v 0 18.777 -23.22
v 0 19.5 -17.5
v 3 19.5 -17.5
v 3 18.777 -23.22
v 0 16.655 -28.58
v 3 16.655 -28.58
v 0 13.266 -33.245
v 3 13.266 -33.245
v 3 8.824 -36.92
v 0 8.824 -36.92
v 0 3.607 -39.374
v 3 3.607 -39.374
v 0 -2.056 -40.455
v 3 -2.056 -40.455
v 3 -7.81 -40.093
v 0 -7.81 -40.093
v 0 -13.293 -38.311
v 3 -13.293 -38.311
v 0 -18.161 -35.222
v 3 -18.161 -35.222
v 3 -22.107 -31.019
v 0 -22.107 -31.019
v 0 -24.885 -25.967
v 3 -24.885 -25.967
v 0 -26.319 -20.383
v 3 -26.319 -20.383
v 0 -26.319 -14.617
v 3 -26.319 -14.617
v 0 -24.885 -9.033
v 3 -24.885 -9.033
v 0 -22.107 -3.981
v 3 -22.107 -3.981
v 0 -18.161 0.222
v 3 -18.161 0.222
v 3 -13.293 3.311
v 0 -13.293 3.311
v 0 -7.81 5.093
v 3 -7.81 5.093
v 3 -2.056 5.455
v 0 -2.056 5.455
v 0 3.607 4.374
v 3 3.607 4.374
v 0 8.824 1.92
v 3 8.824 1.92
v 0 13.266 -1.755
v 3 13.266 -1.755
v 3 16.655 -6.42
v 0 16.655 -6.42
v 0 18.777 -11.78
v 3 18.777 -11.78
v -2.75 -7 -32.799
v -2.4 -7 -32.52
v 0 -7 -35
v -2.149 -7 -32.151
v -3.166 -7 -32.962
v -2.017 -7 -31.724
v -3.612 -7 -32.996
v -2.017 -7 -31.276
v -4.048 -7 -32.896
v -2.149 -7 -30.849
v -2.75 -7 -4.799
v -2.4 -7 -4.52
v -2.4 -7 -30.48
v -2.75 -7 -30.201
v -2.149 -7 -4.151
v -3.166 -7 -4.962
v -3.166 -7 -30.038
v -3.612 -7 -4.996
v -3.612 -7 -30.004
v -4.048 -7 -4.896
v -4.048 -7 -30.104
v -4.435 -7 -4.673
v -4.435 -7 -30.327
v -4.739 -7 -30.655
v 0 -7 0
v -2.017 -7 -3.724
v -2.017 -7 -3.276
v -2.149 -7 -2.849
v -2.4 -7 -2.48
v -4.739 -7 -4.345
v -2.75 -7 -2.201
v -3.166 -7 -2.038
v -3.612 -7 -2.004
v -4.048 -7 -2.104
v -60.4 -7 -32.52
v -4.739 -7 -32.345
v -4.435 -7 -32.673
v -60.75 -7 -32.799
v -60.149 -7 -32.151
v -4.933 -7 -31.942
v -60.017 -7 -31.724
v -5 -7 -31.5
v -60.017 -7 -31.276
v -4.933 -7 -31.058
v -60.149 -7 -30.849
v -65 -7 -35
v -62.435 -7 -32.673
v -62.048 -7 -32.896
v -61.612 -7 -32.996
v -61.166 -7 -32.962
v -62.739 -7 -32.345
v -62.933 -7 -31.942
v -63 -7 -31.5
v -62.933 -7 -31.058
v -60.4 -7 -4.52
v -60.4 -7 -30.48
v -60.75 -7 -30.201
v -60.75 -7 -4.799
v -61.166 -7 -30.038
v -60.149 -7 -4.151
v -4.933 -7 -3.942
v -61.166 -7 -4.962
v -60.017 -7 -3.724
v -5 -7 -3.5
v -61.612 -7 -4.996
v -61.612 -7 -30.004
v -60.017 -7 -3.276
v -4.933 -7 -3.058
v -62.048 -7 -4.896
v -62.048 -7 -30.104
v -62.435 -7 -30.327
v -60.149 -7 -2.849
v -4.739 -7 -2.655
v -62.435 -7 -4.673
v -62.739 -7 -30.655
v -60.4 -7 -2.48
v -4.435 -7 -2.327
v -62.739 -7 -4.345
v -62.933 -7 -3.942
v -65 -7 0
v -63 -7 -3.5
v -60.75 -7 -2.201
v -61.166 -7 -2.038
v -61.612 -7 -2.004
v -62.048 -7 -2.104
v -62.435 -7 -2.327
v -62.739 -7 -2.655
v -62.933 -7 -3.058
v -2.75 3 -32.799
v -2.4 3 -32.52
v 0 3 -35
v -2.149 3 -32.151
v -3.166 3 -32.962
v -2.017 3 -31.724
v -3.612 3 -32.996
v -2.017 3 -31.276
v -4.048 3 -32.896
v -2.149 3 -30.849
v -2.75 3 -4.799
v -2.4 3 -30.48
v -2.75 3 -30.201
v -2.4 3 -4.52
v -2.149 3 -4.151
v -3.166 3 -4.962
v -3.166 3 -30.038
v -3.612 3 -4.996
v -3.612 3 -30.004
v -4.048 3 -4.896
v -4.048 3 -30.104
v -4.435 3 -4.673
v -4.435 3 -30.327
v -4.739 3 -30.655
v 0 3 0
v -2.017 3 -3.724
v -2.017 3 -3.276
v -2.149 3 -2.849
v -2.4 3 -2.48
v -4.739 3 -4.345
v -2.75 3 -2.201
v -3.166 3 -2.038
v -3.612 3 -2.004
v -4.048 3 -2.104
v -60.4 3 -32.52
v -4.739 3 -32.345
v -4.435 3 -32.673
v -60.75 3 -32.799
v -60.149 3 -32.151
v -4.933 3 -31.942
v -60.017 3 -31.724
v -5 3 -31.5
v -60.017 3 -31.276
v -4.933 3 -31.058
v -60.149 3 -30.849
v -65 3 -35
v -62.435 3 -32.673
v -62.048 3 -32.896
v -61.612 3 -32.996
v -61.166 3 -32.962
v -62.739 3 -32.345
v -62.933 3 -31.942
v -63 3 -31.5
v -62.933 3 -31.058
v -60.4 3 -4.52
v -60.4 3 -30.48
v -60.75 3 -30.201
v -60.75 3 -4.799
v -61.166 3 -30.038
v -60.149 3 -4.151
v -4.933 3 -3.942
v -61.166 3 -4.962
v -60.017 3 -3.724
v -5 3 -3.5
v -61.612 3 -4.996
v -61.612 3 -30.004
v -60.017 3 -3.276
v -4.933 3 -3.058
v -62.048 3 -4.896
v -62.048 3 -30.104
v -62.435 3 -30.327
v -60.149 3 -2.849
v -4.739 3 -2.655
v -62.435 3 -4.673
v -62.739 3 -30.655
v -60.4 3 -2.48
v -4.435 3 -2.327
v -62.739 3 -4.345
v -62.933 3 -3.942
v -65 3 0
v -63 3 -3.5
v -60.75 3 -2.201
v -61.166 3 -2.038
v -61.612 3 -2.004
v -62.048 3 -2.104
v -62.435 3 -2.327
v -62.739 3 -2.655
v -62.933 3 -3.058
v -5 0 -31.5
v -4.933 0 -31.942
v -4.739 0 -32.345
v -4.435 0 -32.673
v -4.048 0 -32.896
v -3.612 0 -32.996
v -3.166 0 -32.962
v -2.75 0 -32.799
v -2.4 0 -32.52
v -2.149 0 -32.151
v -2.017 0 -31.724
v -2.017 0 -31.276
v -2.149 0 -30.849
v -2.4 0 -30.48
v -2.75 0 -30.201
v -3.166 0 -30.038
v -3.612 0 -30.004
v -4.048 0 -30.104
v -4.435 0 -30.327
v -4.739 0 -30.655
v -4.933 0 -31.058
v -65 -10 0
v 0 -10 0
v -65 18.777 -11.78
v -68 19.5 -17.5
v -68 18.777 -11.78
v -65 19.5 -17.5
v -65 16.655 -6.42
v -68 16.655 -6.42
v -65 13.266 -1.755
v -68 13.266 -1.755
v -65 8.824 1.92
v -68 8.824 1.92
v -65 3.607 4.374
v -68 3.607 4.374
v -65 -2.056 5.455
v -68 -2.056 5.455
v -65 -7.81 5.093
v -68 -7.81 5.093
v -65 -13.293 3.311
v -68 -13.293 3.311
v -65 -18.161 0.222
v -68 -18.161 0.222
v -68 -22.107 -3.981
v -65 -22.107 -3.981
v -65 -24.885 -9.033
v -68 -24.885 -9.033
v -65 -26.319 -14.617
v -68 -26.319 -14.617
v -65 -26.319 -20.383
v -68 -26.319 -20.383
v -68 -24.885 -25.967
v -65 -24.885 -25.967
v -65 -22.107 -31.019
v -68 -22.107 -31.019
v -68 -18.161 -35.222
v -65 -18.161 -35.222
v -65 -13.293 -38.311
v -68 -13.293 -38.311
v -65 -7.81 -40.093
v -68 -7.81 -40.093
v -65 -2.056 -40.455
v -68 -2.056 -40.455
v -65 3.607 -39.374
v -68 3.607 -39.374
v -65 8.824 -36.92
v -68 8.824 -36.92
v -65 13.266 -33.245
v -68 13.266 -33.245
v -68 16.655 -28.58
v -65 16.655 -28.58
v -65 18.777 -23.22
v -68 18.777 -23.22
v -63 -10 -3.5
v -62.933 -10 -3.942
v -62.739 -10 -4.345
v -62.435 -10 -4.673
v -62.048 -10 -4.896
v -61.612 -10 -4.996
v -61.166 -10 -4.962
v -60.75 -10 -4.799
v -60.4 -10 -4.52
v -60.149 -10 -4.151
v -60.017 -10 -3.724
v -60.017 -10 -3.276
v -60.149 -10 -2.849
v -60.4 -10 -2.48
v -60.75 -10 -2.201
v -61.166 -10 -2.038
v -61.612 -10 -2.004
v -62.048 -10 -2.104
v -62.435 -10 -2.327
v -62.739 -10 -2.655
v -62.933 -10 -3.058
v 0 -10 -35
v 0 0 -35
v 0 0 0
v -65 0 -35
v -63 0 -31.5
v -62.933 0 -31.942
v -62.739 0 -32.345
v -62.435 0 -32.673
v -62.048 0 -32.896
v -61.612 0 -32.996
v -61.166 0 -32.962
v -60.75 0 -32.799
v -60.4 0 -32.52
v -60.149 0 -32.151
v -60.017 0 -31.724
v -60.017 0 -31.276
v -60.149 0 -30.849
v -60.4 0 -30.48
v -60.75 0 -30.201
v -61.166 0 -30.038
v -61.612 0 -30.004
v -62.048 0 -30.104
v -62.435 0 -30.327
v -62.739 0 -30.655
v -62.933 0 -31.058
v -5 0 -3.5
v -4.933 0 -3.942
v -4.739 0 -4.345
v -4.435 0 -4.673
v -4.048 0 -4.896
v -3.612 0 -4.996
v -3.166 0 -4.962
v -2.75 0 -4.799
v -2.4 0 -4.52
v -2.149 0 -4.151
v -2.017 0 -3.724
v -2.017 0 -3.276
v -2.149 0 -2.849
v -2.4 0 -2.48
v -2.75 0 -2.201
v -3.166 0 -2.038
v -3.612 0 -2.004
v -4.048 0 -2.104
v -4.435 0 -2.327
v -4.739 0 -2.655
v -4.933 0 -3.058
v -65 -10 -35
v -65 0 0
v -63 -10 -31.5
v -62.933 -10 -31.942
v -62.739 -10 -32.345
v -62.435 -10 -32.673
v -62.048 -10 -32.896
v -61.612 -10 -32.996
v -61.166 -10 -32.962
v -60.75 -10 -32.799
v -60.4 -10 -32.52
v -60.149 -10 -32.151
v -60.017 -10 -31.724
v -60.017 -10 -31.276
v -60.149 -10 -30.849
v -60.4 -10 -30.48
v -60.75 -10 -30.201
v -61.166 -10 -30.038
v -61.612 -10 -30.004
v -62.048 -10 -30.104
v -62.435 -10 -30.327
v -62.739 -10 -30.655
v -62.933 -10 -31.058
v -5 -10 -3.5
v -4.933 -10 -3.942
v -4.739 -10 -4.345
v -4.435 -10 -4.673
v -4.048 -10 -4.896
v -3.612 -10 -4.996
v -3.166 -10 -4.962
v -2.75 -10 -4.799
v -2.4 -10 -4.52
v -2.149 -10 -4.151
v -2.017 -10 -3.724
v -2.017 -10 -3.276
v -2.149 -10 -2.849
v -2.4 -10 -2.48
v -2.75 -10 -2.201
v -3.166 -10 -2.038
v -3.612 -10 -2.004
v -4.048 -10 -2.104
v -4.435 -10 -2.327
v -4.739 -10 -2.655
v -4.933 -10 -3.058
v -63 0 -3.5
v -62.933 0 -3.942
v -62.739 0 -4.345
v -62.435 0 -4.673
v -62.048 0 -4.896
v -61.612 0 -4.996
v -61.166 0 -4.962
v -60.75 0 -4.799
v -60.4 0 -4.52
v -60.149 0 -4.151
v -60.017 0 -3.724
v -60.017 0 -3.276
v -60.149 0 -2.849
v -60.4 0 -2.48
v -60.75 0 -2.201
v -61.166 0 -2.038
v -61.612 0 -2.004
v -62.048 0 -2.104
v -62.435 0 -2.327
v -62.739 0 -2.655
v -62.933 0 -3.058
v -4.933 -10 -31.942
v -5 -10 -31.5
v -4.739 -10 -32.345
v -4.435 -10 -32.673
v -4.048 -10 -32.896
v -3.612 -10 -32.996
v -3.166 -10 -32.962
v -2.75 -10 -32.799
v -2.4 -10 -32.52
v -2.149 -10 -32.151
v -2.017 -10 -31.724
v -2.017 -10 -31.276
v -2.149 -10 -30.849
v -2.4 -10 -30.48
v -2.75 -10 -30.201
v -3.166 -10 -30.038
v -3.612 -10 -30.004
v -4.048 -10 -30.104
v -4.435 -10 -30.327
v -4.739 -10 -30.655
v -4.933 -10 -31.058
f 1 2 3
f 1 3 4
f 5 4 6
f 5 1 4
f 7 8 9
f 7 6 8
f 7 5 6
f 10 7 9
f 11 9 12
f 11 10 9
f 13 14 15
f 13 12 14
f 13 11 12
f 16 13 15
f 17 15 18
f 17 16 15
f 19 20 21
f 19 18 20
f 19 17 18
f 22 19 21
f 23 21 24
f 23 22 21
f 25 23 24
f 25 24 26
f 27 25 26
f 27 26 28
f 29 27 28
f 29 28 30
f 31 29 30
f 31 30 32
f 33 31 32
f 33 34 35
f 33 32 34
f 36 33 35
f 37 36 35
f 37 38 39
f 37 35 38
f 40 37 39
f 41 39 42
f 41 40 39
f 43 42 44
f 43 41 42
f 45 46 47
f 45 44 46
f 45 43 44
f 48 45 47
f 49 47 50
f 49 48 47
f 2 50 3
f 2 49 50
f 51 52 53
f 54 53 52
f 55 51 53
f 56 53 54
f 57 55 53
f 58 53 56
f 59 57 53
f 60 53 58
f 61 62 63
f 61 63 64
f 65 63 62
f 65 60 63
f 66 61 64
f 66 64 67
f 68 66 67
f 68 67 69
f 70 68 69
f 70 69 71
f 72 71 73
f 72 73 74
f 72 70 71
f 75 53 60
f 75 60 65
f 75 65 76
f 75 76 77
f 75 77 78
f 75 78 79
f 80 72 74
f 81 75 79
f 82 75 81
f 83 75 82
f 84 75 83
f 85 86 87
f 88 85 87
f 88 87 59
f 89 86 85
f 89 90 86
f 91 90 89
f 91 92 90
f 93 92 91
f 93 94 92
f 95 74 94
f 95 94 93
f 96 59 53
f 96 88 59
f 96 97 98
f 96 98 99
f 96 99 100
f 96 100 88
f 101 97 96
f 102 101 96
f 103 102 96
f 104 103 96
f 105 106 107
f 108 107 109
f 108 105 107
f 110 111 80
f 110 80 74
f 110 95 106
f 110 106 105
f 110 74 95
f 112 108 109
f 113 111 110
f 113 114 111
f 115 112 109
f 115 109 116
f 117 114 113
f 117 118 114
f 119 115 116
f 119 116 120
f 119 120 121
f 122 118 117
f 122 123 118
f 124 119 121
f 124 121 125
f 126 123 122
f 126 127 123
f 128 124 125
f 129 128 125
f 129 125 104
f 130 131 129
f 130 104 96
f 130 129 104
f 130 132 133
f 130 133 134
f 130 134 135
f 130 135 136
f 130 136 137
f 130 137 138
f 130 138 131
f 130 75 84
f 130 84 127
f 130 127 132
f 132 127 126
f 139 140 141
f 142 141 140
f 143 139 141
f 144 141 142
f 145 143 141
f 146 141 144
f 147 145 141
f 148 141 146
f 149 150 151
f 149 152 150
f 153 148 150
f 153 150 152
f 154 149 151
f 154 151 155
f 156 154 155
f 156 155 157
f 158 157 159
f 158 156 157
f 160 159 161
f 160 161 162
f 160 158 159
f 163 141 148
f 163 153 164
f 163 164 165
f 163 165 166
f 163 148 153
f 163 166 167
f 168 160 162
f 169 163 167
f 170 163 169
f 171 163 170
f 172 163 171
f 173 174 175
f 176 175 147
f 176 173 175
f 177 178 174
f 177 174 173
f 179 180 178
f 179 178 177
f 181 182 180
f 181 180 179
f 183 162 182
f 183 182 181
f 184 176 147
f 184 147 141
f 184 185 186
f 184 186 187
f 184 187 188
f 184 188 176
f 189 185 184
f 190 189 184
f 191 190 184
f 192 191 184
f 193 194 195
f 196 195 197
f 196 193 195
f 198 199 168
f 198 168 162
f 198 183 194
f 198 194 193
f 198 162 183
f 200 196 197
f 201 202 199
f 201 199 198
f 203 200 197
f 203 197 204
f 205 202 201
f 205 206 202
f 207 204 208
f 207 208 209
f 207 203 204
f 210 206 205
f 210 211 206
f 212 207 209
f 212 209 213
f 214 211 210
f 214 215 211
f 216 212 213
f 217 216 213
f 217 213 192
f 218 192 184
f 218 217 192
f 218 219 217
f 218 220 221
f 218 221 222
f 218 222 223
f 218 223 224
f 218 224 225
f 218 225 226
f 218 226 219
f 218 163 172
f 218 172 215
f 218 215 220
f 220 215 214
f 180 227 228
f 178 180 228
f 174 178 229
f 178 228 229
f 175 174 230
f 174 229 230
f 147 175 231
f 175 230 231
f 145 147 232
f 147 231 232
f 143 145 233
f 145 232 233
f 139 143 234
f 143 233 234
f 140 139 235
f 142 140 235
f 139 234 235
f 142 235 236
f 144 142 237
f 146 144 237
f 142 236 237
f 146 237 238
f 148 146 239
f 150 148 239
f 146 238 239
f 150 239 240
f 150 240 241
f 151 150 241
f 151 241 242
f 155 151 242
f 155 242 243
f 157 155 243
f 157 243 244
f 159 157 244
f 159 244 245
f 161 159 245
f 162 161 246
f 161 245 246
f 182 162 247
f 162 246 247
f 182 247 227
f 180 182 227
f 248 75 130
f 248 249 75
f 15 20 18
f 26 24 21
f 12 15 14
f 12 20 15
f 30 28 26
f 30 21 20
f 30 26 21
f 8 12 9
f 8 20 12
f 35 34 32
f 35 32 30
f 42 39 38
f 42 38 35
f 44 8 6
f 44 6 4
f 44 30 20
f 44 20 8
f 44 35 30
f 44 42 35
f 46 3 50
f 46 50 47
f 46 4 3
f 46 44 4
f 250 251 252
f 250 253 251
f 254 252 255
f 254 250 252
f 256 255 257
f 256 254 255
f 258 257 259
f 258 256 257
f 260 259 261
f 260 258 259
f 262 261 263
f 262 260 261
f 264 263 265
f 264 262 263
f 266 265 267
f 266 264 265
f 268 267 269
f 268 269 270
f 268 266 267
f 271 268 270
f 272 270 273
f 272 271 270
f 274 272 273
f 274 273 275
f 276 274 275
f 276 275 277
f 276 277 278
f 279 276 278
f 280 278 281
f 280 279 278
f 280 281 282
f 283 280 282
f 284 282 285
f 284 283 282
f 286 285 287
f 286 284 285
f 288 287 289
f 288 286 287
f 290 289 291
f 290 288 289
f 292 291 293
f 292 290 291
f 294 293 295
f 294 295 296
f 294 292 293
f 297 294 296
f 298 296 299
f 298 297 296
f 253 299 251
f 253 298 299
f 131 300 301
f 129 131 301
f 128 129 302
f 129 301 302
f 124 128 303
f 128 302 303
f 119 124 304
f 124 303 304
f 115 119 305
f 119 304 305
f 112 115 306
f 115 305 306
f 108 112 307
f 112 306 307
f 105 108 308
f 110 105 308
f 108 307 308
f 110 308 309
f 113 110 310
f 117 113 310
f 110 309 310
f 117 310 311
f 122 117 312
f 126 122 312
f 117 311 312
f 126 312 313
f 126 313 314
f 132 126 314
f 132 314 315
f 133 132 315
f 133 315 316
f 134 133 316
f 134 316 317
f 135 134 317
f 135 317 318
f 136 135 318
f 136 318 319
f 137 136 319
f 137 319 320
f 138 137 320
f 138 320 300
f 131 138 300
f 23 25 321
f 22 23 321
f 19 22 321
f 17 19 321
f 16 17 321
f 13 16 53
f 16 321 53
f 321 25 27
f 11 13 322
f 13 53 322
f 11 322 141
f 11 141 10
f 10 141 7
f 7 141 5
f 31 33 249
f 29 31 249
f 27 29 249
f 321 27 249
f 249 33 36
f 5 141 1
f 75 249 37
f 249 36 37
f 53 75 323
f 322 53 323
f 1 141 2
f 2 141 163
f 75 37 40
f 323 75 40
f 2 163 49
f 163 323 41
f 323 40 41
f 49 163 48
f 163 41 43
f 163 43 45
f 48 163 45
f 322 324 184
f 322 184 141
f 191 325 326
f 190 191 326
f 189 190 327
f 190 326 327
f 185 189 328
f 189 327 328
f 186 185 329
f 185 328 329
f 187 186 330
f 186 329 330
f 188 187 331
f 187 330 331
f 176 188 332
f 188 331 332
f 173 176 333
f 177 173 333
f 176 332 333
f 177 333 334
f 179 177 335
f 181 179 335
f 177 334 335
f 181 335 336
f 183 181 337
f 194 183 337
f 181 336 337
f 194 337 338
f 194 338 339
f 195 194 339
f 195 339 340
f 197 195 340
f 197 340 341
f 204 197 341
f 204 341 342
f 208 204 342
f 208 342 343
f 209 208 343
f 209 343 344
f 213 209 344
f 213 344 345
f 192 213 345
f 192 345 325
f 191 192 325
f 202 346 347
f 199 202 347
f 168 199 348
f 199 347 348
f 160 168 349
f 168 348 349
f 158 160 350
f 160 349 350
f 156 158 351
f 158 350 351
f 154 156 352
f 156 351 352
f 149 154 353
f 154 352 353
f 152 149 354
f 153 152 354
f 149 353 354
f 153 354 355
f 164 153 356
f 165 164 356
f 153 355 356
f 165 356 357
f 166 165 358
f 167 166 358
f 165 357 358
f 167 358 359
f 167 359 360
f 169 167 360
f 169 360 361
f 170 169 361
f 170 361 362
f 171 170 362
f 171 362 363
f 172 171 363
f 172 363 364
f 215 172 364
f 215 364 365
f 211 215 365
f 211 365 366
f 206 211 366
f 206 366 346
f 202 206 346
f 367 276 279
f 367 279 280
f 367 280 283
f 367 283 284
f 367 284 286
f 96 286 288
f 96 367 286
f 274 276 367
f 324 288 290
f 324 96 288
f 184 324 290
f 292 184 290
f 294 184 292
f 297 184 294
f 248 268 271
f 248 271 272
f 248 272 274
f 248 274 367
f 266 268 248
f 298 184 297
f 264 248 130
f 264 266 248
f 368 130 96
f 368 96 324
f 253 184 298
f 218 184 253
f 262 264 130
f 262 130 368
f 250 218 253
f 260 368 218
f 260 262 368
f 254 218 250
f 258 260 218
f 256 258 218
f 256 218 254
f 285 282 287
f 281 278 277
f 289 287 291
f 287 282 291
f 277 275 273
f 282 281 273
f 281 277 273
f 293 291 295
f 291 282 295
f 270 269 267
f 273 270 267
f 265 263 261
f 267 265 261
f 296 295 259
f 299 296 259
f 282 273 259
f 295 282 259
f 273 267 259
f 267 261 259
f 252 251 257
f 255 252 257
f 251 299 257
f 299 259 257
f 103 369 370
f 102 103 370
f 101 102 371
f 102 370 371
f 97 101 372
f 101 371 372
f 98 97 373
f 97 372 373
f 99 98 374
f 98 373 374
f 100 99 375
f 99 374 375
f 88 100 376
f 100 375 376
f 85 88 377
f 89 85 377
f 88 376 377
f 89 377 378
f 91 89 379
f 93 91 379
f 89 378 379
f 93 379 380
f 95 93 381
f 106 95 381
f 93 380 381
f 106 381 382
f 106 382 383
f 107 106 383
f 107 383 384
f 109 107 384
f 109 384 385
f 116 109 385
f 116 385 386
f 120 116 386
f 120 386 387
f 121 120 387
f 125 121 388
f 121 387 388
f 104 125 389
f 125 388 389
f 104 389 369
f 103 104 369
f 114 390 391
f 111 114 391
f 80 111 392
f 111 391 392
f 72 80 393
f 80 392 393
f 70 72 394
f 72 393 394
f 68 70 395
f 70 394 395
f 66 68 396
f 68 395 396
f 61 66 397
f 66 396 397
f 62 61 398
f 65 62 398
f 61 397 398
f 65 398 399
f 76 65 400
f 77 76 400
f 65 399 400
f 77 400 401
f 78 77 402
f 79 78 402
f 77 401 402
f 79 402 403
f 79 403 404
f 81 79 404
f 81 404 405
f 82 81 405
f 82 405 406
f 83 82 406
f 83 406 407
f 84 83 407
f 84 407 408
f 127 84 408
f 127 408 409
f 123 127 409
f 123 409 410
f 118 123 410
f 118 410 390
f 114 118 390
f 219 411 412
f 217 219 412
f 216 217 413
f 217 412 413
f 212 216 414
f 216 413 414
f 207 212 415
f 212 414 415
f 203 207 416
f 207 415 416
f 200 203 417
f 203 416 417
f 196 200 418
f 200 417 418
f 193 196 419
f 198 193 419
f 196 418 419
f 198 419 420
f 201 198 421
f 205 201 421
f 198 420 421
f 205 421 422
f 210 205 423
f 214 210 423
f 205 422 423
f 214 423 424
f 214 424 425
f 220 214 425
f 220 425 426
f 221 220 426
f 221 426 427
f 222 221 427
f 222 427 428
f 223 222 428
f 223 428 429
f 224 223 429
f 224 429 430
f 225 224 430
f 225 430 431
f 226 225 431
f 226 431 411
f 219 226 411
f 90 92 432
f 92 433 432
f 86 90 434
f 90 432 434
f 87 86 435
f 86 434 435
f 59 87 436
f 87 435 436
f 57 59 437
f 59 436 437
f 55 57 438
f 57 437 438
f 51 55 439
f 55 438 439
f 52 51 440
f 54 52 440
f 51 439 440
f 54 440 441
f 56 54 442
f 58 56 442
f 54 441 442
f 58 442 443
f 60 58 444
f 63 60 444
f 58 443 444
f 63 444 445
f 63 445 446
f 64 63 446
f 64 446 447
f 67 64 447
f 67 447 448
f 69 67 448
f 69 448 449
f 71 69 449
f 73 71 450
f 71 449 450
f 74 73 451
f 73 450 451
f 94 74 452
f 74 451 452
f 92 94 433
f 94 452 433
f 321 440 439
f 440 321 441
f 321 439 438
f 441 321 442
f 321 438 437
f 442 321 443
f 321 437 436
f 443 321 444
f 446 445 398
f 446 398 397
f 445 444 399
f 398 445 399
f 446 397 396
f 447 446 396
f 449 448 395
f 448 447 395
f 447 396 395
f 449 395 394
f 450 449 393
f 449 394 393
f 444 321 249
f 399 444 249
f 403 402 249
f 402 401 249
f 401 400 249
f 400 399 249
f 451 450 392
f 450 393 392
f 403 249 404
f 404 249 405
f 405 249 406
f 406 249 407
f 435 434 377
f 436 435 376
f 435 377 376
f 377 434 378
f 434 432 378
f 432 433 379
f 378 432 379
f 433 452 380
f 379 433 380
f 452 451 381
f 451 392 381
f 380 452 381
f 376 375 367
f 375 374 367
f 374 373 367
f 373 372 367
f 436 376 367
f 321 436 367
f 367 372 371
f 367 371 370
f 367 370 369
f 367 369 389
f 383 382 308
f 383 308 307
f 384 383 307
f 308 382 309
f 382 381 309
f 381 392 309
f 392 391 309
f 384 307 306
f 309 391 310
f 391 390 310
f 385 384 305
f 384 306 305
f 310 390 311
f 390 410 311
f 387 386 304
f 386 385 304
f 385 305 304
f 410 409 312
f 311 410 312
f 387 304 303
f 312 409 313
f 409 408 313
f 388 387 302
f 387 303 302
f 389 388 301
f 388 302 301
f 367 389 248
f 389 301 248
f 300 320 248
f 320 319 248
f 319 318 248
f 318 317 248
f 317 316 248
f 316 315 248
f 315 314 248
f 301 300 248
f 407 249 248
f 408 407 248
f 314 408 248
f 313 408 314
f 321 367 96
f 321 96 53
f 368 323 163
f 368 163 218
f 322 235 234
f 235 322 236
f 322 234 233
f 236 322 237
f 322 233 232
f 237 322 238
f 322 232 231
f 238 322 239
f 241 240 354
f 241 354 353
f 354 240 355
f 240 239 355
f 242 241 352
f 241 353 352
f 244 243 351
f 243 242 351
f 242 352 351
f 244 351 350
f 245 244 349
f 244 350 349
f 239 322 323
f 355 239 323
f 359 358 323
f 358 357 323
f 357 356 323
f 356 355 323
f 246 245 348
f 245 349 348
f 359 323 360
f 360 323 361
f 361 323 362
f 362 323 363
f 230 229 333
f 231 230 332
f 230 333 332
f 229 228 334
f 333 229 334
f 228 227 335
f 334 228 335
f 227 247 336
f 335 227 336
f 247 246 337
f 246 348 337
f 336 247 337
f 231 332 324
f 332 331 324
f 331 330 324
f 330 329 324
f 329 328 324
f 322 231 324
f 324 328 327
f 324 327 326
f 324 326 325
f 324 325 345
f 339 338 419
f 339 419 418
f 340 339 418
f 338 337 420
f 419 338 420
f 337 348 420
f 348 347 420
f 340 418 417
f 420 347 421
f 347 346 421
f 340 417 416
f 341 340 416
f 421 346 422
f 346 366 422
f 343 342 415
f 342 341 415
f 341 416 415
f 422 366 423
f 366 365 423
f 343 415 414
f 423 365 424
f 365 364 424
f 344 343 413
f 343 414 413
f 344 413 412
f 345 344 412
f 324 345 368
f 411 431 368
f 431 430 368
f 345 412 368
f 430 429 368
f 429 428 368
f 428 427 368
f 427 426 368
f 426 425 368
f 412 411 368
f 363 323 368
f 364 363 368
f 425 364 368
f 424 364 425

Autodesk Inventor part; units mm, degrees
sketch "Sketch2" plane through (0, 0, 0) normal (0, 1, 0) x (-1, 0, 0)
  line L0 (0, 0) -> (65, 0)
  line L1 (65, 0) -> (65, -35)
  line L2 (65, -35) -> (0, -35)
  line L3 (0, -35) -> (0, 0)
  dimension "d1" = 65
  dimension "d2" = 35
extrude "Extrusion1" add sketch "Sketch2" along normal blind 3
ref_plane "Work Plane1" through (0, 1.5, 0) normal (0, 1, 0) x (-1, 0, 0)
sketch "Sketch5" plane through (0, 0, 0) normal (0, 1, 0) x (-1, 0, 0)
  circle A0 centre (3.5, -31.5) radius 1.5
  circle A1 centre (3.5, -3.5) radius 1.5
  circle A2 centre (61.5, -31.5) radius 1.5
  circle A3 centre (61.5, -3.5) radius 1.5
  line L0 (0, 0) -> (0, -35) projected
  line L1 (65, -35) -> (65, 0) projected
  line L2 (0, -35) -> (65, -35) projected
  line L3 (65, 0) -> (0, 0) projected
  dimension "d22" = 3
  dimension "d23" = 3
  dimension "d24" = 3
  dimension "d25" = 3
  dimension "d26" = 3.5
  dimension "d27" = 3.5
  dimension "d28" = 3.5
  dimension "d29" = 3.5
  dimension "d30" = 3.5
  dimension "d31" = 3.5
  dimension "d32" = 3.5
  dimension "d33" = 3.5
extrude "Extrusion4" cut sketch "Sketch5" along normal blind 10 contours A0 | A1 | A2 | A3
pattern_linear "Rectangular Pattern1" count 2 spacing 10 along (0, -1, 0)
ref_plane "Work Plane2" through (-65, -7, 0) normal (1, 0, 0) x (0, 1, 0)
sketch "Sketch6" plane through (-65, -7, 0) normal (1, 0, 0) x (0, 1, 0)
  line L0 (7, -35) -> (10, -35) projected
  line L1 (-3, -35) -> (0, -35) projected
  line L2 (-3, 0) -> (0, 0) projected
  circle A0 centre (3.5, -17.5) radius 23
  line L3 (-3, -35) -> (-3, 0) projected
  line L4 (10, -35) -> (10, 0) projected
  point P0 (7, 0)
  point P1 (8.5, -35)
  point P2 (-1.5, -35)
  point P3 (-1.5, 0)
  point P4 (-1.5, -35)
extrude "Extrusion5" add sketch "Sketch6" against normal blind 3
ref_plane "Work Plane3" through (0, 0, 0) normal (1, 0, 0) x (0, 1, 0)
sketch "Sketch7" plane through (0, 0, 0) normal (1, 0, 0) x (0, 1, 0)
  circle A0 centre (-3.5, -17.5) radius 23
  line L0 (-10, 0) -> (-10, -35) projected
  line L1 (3, 0) -> (3, -35) projected
  line L2 (0, 0) -> (3, 0) projected
  line L3 (-10, -35) -> (-7, -35) projected
  dimension "d49" = 46
extrude "Extrusion6" add sketch "Sketch7" along normal blind 3
equation "\"d26\" = d27"
equation "\"d29\" = d28"
equation "\"d30\" = d28"
equation "\"d31\" = d27"
equation "\"d32\" = d26"
equation "\"d33\" = d30"
properties part number "koszyk na elektro"
